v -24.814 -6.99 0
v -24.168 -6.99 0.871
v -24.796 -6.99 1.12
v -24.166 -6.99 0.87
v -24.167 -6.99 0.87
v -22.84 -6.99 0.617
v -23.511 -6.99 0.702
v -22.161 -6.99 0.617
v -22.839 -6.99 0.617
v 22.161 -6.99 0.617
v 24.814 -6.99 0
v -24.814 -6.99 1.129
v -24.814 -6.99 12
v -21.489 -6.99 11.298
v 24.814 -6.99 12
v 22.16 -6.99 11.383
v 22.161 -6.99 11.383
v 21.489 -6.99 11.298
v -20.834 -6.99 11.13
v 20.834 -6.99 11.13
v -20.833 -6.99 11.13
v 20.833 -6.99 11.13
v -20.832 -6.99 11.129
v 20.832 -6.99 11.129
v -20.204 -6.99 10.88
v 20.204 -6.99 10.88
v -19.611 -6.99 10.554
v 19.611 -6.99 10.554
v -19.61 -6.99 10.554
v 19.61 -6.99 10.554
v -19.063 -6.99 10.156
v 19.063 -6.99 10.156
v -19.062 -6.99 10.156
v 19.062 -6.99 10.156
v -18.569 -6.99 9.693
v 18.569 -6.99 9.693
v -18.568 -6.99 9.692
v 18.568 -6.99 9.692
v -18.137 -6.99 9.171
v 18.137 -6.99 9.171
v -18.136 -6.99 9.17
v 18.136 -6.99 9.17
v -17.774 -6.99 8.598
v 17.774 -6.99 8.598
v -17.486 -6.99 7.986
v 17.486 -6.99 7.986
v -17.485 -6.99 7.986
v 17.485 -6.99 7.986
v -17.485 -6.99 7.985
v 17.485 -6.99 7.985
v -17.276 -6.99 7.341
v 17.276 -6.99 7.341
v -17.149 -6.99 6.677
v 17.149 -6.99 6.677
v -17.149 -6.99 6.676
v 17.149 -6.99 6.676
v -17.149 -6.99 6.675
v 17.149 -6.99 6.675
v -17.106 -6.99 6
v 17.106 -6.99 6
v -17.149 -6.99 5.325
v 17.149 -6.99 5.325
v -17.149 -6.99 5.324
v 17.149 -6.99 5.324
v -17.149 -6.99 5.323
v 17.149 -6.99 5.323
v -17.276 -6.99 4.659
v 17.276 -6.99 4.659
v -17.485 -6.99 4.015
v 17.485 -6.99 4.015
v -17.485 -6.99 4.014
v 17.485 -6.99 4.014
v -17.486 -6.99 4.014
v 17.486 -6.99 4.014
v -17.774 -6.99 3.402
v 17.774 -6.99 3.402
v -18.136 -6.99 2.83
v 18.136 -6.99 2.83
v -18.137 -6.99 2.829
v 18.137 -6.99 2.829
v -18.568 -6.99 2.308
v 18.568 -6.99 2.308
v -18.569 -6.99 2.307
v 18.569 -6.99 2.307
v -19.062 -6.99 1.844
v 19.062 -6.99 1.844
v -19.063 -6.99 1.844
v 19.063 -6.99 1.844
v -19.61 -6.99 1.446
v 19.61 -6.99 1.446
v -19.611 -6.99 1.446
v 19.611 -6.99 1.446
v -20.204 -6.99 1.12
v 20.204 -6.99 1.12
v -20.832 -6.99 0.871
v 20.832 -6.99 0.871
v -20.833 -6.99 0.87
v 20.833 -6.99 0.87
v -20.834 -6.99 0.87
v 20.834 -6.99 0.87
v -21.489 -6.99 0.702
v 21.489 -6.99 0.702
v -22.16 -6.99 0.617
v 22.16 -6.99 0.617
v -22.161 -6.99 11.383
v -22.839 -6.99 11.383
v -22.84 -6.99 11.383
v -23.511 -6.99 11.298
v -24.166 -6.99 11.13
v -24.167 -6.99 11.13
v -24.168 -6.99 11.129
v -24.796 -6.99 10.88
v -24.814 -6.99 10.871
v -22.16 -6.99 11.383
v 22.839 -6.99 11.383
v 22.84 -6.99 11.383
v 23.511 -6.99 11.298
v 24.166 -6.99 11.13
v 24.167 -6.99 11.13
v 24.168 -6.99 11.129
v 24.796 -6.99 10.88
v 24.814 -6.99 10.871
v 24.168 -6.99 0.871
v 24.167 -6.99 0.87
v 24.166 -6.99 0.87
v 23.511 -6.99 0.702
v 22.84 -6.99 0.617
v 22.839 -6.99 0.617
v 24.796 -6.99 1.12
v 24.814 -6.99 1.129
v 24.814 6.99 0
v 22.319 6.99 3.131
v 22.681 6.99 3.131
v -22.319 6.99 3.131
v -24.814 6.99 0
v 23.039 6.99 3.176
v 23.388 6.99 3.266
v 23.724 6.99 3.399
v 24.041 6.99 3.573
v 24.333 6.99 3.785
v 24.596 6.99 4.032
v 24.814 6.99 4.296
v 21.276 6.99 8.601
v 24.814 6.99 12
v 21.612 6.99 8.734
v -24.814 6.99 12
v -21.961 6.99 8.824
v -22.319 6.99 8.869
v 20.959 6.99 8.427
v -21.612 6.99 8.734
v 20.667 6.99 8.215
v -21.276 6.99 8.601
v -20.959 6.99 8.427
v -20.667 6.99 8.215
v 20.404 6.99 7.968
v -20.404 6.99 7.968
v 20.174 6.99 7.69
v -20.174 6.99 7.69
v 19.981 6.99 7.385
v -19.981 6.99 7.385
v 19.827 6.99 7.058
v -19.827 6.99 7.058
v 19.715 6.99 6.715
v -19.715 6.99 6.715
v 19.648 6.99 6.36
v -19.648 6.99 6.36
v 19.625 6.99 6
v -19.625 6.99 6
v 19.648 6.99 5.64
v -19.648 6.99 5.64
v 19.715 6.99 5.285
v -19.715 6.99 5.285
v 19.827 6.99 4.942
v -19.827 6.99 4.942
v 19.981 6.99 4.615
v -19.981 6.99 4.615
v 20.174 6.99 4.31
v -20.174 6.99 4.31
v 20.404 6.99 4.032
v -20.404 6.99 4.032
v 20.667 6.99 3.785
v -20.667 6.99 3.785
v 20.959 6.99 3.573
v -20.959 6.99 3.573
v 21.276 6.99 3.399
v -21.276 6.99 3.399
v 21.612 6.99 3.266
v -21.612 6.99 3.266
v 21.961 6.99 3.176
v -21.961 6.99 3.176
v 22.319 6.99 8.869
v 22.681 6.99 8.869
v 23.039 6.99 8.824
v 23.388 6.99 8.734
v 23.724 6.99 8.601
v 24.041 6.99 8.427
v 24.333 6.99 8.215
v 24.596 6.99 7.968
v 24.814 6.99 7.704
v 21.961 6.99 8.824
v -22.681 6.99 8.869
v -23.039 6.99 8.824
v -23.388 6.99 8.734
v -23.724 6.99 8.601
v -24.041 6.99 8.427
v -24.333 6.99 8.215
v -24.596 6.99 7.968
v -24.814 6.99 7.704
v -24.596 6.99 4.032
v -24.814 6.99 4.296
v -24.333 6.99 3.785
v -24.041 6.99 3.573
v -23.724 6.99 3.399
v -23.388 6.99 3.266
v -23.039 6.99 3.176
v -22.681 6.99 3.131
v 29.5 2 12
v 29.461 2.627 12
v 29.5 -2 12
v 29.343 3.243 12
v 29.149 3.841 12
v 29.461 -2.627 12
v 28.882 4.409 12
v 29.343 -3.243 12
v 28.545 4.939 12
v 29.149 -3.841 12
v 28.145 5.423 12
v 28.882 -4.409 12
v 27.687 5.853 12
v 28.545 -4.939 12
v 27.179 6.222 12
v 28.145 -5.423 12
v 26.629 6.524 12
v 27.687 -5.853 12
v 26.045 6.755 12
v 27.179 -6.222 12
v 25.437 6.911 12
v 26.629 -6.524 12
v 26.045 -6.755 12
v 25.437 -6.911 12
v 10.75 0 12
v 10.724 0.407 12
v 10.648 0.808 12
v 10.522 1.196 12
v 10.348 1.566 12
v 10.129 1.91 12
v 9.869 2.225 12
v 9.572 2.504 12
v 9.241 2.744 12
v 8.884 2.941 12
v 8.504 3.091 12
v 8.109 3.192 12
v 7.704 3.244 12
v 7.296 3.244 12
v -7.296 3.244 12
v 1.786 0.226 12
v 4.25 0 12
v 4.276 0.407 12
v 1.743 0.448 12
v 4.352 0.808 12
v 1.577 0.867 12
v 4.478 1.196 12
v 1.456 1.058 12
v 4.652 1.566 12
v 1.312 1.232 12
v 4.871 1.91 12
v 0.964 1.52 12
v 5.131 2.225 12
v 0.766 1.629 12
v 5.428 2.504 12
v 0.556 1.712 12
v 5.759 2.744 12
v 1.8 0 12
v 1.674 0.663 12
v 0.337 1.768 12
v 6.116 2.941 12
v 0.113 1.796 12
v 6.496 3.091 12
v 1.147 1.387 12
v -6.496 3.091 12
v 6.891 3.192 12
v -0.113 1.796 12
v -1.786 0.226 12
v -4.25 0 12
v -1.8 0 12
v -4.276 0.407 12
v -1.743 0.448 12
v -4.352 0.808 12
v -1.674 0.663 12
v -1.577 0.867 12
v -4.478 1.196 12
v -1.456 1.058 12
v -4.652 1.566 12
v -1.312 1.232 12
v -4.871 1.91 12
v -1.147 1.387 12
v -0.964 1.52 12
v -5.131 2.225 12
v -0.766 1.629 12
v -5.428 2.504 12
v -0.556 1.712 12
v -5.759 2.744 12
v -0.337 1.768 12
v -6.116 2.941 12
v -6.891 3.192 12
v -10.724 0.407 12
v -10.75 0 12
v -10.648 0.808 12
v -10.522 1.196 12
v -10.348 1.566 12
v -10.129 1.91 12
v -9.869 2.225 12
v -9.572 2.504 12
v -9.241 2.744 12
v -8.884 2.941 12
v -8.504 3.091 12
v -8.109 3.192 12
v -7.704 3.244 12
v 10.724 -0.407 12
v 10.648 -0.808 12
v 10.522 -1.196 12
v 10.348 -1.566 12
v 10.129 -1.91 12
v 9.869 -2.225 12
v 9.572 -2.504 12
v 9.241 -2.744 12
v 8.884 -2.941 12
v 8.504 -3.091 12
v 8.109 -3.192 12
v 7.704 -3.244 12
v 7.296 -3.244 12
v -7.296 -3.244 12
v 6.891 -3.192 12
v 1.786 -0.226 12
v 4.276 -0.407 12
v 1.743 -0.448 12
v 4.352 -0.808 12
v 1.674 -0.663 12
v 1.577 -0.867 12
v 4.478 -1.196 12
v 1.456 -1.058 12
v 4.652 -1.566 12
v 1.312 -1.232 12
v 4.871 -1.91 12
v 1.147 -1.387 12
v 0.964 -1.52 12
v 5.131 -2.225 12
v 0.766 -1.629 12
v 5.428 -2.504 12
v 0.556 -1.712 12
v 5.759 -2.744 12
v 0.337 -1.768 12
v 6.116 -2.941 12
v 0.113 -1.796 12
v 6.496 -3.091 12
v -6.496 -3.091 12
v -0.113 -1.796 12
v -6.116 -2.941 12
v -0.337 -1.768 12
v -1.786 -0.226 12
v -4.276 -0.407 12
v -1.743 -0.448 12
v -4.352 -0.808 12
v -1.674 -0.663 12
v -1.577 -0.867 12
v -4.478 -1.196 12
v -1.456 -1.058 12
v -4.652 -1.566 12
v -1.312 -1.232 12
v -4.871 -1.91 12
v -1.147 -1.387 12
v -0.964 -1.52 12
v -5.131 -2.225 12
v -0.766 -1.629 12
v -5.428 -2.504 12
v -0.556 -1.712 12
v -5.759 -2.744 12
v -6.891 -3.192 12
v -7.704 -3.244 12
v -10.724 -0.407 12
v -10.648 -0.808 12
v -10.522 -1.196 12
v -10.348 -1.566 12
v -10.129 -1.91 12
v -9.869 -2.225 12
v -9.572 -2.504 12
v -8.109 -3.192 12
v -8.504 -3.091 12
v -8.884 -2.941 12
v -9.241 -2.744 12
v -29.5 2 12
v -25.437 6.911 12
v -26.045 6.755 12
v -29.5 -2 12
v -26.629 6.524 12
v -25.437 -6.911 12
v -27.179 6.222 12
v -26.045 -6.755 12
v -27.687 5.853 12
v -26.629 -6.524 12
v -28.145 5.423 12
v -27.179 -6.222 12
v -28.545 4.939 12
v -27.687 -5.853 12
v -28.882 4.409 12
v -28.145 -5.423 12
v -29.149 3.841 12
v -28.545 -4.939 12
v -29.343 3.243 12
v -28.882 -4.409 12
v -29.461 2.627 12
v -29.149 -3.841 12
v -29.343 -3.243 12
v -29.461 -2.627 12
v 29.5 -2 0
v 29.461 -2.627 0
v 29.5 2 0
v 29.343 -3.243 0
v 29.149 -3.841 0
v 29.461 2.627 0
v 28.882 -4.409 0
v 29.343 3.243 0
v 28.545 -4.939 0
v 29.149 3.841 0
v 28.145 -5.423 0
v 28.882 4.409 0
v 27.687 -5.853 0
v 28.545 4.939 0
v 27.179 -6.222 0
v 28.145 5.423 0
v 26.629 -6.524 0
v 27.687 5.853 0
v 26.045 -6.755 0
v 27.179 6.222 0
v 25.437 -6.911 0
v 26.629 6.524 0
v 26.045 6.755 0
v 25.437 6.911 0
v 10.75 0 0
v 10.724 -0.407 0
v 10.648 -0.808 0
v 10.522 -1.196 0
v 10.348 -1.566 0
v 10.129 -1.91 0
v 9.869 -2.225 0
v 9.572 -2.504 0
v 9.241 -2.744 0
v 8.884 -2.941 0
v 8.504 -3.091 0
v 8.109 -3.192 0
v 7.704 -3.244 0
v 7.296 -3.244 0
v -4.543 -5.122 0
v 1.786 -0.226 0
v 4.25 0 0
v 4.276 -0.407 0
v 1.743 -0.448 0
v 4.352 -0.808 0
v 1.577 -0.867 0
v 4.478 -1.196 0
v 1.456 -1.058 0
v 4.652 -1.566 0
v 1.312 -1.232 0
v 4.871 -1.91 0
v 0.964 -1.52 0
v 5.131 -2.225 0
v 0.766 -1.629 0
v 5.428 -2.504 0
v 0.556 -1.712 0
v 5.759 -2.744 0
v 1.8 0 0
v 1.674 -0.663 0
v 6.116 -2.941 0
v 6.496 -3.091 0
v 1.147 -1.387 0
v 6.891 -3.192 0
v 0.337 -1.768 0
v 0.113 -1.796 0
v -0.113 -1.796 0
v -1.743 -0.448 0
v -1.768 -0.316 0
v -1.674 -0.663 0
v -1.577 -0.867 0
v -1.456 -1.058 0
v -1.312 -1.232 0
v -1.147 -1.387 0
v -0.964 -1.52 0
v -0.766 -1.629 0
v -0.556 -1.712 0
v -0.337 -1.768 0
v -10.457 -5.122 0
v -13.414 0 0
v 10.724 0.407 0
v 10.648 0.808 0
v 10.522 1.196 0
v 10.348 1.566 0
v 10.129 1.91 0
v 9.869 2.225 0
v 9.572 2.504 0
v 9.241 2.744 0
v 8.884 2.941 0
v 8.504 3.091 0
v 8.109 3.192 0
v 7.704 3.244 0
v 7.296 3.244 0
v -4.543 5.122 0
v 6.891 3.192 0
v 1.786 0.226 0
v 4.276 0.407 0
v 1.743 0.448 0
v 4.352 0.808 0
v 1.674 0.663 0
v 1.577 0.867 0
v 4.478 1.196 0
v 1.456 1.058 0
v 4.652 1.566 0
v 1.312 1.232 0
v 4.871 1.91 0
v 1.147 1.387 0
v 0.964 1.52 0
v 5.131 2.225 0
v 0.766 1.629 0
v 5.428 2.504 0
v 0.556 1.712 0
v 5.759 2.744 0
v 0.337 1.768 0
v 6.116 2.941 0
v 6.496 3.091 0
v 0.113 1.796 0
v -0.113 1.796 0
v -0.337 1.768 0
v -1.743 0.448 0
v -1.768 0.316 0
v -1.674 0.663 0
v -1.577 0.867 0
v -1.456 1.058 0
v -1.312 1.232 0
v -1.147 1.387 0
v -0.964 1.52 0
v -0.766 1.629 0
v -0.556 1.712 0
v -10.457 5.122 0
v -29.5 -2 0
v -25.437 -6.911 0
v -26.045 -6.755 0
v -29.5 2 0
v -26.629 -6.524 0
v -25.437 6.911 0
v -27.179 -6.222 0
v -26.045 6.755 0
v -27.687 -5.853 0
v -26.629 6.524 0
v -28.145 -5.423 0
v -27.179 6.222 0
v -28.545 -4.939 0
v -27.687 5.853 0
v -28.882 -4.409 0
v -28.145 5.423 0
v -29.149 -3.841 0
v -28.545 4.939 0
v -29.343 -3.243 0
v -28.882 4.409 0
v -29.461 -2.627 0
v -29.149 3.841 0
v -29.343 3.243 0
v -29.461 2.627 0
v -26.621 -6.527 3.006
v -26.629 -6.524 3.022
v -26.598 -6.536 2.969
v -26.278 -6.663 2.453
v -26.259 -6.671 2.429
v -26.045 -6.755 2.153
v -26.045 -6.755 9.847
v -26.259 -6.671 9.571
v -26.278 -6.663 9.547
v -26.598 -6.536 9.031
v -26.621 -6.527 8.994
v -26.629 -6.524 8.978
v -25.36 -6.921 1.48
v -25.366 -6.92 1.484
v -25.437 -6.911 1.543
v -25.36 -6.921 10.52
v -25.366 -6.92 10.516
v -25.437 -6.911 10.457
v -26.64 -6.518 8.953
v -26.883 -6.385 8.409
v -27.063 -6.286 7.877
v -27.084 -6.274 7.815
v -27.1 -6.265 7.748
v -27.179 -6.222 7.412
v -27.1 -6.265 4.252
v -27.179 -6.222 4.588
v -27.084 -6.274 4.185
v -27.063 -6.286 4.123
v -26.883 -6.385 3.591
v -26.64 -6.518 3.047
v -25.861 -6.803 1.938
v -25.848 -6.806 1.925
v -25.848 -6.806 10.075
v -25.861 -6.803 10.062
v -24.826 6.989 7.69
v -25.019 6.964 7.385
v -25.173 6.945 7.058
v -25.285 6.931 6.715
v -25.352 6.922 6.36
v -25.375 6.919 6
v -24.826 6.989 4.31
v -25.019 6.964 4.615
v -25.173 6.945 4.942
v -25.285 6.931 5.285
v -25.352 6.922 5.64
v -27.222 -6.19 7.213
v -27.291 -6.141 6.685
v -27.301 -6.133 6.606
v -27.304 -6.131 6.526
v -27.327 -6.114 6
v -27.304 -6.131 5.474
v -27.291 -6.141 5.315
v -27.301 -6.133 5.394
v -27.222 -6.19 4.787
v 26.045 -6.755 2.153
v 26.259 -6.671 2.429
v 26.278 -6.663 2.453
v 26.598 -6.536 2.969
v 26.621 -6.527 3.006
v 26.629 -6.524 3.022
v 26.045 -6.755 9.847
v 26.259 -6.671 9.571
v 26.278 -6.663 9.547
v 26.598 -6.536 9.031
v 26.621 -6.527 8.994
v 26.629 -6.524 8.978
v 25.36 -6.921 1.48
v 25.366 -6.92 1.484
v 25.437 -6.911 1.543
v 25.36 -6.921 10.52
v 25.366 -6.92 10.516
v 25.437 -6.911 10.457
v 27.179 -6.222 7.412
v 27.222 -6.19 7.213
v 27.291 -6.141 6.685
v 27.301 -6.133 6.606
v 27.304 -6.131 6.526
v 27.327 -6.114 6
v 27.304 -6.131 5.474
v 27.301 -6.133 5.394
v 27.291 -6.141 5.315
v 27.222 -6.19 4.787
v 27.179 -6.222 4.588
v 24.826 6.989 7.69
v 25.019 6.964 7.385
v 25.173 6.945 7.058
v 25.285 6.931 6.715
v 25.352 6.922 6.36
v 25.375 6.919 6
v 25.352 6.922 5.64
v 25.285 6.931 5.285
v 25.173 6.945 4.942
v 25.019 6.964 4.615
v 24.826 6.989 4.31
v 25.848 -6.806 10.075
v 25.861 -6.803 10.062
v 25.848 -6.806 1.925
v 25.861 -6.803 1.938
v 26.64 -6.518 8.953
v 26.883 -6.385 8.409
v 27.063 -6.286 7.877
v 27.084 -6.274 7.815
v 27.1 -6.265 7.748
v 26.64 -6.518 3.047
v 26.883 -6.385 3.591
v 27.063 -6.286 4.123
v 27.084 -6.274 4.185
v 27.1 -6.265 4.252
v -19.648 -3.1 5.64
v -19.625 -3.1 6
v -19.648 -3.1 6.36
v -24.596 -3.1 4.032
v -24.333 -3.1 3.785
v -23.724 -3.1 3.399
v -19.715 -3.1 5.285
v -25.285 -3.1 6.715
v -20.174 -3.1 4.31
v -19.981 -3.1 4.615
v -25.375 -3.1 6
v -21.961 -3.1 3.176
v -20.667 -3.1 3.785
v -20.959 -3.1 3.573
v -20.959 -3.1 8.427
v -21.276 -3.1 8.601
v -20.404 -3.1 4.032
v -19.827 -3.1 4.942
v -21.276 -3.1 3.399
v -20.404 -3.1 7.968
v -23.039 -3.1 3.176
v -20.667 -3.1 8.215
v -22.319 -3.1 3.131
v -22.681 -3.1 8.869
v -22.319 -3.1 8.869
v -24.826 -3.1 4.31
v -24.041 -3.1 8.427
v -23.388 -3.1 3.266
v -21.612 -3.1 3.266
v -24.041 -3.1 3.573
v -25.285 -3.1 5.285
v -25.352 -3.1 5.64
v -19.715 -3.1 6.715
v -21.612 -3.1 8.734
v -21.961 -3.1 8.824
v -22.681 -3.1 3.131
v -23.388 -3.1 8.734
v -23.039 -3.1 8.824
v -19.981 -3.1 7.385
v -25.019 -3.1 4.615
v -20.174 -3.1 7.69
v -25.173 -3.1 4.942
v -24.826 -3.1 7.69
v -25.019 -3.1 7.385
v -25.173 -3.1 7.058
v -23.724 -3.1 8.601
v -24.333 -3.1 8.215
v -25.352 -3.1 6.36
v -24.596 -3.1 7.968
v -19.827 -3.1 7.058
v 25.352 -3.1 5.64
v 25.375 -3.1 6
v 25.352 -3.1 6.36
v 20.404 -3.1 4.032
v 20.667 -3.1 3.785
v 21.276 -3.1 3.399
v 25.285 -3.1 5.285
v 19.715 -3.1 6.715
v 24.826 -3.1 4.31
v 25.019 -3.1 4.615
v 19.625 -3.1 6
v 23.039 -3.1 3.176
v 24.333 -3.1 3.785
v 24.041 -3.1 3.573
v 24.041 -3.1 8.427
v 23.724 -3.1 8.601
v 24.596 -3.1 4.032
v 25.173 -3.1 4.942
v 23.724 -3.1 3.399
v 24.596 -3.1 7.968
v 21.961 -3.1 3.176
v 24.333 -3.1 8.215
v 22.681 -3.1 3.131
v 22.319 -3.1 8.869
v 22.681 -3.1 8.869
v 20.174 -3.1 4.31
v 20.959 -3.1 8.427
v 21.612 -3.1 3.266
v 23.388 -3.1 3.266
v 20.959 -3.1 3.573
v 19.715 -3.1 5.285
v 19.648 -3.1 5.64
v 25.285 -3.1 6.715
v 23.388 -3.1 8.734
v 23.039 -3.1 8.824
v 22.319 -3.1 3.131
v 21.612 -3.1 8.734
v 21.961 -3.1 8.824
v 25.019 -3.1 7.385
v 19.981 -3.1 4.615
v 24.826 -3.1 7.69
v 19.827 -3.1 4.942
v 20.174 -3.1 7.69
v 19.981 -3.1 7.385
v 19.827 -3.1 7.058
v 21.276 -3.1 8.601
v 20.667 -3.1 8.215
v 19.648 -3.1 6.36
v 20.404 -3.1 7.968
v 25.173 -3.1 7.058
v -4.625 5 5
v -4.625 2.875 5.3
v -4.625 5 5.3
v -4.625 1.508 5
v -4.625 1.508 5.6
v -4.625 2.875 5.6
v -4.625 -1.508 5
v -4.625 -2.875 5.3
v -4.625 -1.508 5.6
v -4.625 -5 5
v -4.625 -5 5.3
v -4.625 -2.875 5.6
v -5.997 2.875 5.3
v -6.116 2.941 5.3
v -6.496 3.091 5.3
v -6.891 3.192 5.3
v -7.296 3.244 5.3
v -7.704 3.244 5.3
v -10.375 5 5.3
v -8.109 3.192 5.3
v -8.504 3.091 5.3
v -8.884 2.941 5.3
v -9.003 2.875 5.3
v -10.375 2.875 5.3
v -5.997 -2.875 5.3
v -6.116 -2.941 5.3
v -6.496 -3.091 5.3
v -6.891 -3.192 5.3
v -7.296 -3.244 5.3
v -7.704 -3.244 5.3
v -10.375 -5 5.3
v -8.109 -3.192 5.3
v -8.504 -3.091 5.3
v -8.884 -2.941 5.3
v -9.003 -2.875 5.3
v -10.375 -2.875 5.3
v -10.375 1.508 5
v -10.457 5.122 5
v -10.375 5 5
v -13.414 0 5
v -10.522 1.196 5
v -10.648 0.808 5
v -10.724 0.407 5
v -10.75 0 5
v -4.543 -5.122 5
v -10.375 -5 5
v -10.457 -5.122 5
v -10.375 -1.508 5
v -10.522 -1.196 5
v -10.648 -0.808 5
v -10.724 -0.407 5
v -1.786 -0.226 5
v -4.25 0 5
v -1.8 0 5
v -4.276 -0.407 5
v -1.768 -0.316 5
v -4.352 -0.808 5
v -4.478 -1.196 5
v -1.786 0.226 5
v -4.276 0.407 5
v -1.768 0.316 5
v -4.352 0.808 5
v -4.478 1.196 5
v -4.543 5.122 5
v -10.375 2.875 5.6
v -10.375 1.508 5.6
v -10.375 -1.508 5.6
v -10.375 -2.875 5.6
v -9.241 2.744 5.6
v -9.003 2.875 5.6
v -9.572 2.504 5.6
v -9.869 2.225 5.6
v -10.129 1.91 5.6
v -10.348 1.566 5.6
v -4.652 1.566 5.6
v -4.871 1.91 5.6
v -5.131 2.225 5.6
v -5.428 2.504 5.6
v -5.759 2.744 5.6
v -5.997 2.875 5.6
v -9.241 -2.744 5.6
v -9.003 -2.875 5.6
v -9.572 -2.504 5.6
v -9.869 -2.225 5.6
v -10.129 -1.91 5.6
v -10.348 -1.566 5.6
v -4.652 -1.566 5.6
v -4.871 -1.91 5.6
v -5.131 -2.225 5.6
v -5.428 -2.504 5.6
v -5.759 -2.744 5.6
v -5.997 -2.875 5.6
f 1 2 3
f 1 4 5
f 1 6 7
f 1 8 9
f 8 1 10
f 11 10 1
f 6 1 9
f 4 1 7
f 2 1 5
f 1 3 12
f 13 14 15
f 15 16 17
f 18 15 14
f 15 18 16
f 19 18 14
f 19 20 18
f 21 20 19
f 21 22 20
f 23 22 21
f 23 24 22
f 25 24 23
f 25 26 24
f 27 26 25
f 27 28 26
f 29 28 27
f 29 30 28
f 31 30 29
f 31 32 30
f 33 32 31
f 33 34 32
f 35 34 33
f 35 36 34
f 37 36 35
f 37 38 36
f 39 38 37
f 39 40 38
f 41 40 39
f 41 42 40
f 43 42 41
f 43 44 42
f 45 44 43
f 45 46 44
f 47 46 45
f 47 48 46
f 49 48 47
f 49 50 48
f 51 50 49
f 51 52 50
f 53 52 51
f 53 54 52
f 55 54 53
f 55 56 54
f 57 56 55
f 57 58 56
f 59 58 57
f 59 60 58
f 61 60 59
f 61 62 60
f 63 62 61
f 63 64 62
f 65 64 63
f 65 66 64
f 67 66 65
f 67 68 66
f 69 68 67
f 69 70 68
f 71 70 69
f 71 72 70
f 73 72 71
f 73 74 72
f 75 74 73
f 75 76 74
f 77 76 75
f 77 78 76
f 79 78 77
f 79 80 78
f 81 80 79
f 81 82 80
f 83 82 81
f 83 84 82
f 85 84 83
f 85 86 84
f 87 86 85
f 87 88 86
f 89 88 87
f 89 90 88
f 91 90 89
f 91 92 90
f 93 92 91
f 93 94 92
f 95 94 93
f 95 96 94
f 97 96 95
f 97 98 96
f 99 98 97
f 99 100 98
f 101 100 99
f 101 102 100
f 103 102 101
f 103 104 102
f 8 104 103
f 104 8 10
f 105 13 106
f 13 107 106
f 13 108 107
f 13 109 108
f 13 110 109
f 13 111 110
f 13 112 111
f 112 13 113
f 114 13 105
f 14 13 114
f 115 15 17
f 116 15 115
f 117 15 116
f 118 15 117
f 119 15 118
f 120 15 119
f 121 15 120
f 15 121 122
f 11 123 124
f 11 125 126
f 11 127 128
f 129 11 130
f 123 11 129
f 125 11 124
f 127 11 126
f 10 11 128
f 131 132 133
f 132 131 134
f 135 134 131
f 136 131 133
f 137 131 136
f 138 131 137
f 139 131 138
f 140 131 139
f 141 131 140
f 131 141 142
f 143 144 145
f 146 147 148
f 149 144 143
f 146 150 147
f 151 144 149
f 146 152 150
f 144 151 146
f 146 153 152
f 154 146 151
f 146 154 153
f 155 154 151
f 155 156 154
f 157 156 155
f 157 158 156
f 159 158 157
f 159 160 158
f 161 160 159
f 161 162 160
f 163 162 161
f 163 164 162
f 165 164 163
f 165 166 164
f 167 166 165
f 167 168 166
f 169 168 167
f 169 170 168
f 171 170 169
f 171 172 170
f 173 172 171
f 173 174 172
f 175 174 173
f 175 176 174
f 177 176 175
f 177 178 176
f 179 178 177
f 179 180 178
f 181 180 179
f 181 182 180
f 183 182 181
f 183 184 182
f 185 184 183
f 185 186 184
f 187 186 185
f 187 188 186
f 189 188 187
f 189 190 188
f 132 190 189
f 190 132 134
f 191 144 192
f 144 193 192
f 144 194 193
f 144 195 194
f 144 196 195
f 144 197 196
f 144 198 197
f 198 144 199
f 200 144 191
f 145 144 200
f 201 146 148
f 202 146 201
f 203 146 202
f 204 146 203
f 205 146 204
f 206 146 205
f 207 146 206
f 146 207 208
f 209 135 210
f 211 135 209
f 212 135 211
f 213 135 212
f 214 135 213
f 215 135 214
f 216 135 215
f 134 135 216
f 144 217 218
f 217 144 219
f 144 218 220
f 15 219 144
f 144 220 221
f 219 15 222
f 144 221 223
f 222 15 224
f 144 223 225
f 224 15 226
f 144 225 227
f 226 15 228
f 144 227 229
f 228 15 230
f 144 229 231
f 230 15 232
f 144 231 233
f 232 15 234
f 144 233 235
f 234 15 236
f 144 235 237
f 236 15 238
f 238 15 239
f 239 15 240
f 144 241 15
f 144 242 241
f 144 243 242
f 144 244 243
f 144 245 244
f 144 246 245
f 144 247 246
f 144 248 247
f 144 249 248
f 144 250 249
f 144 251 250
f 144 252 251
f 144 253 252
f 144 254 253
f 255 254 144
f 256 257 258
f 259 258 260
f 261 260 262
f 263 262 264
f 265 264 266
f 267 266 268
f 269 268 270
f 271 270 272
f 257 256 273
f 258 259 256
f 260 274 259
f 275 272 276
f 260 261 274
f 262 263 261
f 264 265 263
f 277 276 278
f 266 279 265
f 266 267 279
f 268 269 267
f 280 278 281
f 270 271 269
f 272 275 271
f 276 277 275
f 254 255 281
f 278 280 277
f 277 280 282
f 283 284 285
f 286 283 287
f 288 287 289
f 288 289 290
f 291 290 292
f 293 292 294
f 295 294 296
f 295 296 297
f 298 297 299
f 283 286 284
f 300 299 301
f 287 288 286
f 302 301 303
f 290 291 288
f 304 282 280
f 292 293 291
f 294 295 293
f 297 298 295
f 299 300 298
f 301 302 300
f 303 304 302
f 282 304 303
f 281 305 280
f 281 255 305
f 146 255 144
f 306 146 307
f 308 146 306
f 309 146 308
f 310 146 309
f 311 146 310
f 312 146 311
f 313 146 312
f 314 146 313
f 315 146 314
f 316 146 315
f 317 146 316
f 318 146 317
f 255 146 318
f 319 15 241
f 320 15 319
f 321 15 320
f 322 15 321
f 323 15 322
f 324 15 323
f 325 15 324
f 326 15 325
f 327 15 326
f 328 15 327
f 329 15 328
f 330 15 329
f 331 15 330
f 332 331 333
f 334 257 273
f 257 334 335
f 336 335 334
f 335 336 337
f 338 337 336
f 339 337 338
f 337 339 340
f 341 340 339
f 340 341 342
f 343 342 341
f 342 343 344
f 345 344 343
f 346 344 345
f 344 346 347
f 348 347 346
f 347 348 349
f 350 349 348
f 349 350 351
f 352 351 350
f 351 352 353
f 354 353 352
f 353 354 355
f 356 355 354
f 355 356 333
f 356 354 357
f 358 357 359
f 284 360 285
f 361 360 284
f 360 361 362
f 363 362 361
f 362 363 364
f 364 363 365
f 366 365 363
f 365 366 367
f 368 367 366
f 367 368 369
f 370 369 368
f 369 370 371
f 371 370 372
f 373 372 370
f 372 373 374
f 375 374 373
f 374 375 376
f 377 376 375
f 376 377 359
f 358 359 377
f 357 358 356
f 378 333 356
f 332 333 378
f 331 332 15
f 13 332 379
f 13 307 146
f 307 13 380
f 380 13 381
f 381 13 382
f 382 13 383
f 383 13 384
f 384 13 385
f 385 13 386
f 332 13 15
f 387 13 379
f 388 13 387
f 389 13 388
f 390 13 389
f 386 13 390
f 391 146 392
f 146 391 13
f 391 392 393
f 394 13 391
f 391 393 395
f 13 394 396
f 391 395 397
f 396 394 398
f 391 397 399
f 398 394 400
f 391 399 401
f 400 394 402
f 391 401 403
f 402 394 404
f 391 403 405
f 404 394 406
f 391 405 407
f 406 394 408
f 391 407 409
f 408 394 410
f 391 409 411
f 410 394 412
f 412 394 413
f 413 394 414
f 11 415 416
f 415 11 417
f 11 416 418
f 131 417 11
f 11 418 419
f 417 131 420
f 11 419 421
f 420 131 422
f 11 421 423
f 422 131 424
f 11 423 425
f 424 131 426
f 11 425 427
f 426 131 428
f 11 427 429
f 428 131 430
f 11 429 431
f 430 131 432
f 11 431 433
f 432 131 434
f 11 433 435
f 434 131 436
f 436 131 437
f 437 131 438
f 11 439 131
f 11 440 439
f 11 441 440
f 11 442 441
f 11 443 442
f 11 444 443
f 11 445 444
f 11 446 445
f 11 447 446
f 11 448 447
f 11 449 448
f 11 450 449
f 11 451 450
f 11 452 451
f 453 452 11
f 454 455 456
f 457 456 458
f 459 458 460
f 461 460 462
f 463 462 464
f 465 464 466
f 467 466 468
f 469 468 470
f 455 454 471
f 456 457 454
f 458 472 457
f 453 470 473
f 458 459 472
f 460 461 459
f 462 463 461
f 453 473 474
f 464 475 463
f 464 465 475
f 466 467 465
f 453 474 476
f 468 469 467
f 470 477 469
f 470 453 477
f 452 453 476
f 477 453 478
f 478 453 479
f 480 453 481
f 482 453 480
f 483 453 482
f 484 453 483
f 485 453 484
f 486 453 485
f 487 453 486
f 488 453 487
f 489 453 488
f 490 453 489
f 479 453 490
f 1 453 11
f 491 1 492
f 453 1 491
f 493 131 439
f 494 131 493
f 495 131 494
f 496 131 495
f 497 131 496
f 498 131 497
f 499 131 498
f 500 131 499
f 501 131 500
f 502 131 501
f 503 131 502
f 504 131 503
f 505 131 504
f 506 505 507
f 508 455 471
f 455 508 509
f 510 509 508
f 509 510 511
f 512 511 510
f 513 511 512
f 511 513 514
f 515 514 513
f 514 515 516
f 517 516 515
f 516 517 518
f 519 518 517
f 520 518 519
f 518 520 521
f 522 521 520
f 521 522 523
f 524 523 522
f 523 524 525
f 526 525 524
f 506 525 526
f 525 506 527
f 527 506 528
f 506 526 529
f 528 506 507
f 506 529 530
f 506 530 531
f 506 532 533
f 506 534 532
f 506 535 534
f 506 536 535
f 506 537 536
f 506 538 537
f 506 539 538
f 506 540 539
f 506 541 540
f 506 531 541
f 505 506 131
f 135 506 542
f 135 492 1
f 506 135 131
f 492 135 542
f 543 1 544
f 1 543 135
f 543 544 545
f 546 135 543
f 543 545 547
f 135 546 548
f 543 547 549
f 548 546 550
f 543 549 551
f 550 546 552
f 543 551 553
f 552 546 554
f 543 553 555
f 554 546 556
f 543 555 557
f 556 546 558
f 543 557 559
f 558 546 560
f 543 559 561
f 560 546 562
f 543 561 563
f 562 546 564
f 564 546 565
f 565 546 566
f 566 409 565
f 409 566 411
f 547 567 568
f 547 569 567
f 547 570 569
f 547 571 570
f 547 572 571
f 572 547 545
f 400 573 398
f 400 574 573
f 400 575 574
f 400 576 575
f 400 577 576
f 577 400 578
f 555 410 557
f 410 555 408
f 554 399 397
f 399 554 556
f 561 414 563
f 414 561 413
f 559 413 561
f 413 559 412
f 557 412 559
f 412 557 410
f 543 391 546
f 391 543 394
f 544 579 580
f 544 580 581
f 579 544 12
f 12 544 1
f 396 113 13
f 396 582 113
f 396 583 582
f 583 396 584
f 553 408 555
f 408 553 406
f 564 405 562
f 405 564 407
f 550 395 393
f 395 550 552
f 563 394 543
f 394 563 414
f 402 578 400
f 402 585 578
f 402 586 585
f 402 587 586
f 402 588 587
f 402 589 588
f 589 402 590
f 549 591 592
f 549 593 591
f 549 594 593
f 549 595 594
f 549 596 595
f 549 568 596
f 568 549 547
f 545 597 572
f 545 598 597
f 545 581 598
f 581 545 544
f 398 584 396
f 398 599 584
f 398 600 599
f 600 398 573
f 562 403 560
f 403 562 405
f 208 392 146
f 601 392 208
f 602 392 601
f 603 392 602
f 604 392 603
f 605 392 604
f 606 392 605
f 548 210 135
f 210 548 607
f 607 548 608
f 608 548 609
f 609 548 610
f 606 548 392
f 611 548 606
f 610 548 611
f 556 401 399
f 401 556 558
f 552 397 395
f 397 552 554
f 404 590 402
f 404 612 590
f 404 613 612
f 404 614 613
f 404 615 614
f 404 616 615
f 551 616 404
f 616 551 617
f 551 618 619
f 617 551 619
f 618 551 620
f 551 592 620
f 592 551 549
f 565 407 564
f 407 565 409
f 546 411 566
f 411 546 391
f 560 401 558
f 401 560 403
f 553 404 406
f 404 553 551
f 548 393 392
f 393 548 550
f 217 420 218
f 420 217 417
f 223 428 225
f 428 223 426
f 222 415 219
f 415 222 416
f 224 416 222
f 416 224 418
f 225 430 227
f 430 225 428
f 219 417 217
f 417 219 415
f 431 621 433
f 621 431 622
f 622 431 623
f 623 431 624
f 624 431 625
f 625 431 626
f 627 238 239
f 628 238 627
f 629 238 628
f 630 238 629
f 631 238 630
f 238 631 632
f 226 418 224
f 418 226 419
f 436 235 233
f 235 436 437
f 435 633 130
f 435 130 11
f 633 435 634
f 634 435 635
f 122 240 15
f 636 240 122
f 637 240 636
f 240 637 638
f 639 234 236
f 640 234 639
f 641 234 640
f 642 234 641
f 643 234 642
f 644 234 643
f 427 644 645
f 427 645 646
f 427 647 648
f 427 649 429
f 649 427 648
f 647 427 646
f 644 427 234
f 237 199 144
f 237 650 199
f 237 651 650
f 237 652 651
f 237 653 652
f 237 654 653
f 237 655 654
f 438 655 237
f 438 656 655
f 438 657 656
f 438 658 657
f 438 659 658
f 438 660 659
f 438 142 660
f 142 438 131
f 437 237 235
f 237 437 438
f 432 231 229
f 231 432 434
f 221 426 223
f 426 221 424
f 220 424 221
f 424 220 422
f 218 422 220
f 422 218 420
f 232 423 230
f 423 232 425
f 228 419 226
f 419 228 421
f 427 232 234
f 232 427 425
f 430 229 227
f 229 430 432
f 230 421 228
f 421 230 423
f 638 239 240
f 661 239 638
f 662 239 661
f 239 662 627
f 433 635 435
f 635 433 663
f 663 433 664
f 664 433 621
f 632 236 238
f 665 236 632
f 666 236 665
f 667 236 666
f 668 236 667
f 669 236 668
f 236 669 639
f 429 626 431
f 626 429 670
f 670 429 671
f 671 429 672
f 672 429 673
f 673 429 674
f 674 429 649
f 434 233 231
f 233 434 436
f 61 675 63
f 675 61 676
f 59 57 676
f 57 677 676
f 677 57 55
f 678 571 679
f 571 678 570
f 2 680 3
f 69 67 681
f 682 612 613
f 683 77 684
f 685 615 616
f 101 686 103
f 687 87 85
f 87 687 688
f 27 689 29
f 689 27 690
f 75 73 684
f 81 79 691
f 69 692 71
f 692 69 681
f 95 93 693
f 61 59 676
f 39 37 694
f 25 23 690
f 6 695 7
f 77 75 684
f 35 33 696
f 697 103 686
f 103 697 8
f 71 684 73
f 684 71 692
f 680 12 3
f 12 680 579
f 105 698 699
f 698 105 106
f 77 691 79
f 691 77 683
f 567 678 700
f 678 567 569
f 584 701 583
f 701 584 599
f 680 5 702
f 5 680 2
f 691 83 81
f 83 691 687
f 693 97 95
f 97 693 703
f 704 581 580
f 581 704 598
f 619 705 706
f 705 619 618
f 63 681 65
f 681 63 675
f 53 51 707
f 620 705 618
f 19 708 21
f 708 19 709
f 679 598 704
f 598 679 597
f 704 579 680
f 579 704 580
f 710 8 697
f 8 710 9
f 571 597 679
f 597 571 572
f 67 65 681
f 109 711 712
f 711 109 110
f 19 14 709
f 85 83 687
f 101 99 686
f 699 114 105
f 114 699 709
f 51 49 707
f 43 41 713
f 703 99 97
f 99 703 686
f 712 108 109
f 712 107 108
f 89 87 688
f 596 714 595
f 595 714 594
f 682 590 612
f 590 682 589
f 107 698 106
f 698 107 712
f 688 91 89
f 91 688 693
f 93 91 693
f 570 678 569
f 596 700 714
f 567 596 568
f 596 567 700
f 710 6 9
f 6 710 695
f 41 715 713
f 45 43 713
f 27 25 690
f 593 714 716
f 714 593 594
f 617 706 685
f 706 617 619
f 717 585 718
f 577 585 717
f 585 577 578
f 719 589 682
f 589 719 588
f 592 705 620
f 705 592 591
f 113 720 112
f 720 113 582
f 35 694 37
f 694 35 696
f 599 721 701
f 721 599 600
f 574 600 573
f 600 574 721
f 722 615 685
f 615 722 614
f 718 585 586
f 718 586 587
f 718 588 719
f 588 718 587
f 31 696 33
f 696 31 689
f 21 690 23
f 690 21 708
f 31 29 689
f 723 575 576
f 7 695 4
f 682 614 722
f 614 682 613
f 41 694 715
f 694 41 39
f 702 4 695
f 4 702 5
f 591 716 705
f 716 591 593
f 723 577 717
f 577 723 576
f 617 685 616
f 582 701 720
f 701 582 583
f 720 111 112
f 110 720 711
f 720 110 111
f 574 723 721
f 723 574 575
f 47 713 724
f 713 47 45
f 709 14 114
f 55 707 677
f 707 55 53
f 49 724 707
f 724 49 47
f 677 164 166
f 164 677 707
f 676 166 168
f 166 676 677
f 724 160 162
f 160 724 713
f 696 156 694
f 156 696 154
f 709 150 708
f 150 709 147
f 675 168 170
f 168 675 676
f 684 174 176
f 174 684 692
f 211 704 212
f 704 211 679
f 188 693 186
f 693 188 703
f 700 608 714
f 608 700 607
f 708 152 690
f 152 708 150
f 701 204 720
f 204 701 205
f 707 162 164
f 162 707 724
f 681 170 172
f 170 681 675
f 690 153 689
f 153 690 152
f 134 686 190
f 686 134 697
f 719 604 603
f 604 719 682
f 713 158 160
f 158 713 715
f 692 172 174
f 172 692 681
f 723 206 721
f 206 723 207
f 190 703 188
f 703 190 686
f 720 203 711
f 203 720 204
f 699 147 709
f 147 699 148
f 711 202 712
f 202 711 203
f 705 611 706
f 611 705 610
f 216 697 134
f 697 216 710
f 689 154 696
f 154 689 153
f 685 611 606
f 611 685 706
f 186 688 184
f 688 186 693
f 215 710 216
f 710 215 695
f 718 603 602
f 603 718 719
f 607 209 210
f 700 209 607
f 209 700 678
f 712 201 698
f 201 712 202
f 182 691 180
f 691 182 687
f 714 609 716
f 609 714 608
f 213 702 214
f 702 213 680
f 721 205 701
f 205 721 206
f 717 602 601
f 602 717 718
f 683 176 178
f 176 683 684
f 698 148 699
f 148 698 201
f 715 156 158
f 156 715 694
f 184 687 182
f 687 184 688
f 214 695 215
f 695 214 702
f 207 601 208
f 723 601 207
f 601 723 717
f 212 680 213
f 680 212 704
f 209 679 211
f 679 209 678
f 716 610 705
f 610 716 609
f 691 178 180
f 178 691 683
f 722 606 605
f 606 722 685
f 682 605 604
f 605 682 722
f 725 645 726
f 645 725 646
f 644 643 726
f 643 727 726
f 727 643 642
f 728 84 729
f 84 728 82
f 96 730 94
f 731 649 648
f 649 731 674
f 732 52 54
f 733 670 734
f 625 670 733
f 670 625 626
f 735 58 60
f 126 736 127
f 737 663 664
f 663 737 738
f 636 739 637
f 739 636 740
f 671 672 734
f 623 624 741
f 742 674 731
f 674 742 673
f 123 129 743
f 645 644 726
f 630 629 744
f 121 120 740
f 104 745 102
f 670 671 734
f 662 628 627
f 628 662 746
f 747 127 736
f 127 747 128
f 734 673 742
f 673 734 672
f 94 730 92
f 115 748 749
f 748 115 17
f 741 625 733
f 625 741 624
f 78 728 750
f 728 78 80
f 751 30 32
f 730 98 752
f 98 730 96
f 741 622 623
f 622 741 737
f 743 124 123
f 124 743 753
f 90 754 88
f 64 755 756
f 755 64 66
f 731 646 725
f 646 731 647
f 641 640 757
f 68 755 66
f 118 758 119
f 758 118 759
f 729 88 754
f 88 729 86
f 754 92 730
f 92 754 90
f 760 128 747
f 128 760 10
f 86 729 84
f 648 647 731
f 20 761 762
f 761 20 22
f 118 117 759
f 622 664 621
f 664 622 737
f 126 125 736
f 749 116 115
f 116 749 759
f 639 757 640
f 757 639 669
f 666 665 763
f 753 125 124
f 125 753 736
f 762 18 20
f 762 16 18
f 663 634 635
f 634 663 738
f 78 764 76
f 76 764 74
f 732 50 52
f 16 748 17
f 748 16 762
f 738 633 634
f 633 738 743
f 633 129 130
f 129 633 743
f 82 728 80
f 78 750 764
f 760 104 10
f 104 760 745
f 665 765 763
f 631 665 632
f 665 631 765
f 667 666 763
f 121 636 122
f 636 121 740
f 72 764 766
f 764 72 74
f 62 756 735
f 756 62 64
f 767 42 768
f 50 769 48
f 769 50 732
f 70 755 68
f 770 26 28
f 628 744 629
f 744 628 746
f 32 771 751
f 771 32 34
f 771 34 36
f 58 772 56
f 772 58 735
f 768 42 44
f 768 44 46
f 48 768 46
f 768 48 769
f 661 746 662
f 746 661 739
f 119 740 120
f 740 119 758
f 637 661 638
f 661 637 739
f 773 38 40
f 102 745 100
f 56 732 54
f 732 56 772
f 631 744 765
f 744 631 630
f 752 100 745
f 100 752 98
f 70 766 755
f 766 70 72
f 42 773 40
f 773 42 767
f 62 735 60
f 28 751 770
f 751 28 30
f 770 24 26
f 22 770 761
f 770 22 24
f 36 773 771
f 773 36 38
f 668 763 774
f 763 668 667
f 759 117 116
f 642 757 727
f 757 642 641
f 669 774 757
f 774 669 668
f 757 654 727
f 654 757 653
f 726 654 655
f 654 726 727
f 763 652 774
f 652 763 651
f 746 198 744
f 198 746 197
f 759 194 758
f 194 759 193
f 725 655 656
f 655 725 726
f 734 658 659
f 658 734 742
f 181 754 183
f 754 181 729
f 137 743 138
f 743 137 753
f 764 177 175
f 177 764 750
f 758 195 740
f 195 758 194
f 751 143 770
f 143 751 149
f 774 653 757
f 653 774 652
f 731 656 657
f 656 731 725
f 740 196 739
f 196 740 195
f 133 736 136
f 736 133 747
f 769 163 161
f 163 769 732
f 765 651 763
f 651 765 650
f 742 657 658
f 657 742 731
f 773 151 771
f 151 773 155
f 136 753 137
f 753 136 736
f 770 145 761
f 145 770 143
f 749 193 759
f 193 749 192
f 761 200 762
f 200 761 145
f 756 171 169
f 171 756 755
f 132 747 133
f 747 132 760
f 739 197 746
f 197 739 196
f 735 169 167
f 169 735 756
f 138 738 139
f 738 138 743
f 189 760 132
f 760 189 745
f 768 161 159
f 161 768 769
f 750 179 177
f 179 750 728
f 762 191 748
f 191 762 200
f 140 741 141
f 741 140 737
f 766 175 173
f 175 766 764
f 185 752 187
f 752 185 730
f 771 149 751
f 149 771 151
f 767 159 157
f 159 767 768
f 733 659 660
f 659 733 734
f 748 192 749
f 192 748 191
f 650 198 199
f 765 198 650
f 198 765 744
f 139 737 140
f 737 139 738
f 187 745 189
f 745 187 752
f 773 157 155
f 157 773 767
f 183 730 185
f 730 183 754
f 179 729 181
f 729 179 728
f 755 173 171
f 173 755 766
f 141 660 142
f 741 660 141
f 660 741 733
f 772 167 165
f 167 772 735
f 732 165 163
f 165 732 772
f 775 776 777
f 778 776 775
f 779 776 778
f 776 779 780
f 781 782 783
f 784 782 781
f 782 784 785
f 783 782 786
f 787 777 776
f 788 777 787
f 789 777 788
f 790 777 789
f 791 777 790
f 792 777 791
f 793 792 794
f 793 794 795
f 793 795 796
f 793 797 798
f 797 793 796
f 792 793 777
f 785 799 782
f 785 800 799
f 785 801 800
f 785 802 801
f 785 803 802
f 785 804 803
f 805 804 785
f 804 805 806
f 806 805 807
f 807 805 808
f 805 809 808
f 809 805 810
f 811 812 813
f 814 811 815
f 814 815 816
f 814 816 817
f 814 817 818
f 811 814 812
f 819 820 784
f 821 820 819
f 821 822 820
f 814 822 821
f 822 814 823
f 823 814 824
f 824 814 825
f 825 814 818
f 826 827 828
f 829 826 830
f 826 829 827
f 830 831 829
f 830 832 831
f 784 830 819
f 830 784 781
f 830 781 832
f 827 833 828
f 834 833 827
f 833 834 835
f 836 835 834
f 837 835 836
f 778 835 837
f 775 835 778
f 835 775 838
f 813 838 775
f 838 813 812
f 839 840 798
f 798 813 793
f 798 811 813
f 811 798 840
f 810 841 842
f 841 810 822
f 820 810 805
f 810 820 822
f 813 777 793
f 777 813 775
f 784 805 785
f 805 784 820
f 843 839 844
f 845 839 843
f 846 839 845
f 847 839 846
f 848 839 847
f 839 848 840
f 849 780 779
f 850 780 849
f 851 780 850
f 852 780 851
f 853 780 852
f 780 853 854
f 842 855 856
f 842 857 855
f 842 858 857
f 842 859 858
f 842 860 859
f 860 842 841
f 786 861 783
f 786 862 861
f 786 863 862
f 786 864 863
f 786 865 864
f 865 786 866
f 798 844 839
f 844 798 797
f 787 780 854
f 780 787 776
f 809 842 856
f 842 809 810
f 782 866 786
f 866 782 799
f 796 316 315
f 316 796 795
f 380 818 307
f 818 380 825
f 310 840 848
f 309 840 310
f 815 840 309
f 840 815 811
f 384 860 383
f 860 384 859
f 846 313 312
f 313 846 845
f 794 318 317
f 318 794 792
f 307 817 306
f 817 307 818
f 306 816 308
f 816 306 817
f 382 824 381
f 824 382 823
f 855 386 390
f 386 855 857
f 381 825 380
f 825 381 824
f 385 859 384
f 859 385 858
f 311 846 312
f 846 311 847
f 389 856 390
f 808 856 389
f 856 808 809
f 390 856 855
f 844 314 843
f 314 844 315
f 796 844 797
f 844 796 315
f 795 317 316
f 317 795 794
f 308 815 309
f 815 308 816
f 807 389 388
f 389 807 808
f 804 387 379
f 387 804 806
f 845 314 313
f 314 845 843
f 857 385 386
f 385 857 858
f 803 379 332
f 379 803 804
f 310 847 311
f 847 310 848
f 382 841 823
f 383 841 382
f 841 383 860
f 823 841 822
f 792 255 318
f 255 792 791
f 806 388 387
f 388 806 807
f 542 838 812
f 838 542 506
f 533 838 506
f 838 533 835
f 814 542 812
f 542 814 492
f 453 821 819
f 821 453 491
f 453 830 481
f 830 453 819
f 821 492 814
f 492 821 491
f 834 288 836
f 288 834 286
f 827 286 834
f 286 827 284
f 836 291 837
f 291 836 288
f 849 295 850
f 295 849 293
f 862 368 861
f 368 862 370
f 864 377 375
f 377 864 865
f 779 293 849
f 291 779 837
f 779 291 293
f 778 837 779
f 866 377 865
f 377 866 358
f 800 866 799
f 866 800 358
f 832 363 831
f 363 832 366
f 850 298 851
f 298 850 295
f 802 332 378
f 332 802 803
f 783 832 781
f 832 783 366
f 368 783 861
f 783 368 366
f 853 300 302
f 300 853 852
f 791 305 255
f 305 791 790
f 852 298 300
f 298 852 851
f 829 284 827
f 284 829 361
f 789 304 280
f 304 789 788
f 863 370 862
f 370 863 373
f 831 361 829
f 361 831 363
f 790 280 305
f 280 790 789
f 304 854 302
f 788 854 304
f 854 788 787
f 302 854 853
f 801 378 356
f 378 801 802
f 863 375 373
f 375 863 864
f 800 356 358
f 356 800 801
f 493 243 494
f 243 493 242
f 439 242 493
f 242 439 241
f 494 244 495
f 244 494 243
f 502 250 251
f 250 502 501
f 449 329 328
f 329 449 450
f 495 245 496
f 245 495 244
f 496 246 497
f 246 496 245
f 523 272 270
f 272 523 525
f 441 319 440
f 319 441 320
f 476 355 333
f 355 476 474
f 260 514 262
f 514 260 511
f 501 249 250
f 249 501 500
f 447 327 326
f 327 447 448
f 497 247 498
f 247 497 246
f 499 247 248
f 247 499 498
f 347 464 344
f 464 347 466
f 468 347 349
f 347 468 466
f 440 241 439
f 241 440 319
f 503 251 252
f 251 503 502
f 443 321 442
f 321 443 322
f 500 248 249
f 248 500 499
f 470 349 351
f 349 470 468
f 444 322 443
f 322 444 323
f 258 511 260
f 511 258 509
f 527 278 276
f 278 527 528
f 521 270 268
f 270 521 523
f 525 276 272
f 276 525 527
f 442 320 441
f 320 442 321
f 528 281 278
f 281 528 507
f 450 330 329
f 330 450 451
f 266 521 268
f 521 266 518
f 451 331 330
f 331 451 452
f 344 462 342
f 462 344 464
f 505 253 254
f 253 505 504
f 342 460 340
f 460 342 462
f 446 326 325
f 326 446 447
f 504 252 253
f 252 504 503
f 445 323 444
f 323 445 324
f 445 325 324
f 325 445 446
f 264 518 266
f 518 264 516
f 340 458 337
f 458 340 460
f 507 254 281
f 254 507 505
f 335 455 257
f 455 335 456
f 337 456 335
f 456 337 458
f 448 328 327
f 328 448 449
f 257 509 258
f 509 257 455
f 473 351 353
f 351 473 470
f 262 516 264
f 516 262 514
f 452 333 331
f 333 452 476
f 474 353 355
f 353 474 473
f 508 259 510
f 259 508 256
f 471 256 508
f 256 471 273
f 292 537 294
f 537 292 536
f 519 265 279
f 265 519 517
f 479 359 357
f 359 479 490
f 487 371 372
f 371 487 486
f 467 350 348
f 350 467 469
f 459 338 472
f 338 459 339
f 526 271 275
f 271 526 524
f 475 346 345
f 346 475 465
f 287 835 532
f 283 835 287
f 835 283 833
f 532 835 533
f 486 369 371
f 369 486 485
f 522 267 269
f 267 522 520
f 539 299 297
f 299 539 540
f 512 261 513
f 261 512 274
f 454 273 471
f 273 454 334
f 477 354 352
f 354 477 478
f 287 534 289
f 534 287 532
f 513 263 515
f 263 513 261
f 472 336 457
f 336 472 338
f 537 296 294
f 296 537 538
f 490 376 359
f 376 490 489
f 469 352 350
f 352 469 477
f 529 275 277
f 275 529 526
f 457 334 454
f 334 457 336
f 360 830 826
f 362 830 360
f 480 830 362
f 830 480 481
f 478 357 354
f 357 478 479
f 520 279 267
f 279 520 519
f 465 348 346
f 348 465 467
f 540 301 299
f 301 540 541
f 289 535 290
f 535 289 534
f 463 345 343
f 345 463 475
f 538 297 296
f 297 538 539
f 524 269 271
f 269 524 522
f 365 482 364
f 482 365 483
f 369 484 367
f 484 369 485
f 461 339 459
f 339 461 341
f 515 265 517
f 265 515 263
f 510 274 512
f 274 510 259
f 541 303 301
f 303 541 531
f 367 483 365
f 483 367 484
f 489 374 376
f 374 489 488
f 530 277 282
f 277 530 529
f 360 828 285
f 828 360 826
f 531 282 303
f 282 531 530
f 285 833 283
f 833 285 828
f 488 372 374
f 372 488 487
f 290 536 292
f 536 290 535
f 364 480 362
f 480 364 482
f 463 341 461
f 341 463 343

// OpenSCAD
$fn = 50;


difference() {
	union() {
		hull() {
			translate(v = [-9.5000000000, 2.0000000000, 0]) {
				cylinder(h = 12, r = 5);
			}
			translate(v = [9.5000000000, 2.0000000000, 0]) {
				cylinder(h = 12, r = 5);
			}
			translate(v = [-9.5000000000, -2.0000000000, 0]) {
				cylinder(h = 12, r = 5);
			}
			translate(v = [9.5000000000, -2.0000000000, 0]) {
				cylinder(h = 12, r = 5);
			}
		}
		translate(v = [-15.0000000000, 0.0000000000, 0]) {
			hull() {
				translate(v = [-9.5000000000, 2.0000000000, 0]) {
					cylinder(h = 12, r = 5);
				}
				translate(v = [9.5000000000, 2.0000000000, 0]) {
					cylinder(h = 12, r = 5);
				}
				translate(v = [-9.5000000000, -2.0000000000, 0]) {
					cylinder(h = 12, r = 5);
				}
				translate(v = [9.5000000000, -2.0000000000, 0]) {
					cylinder(h = 12, r = 5);
				}
			}
		}
		translate(v = [15.0000000000, 0.0000000000, 0]) {
			hull() {
				translate(v = [-9.5000000000, 2.0000000000, 0]) {
					cylinder(h = 12, r = 5);
				}
				translate(v = [9.5000000000, 2.0000000000, 0]) {
					cylinder(h = 12, r = 5);
				}
				translate(v = [-9.5000000000, -2.0000000000, 0]) {
					cylinder(h = 12, r = 5);
				}
				translate(v = [9.5000000000, -2.0000000000, 0]) {
					cylinder(h = 12, r = 5);
				}
			}
		}
	}
	union() {
		translate(v = [-22.5000000000, -7.0000000000, 6.0000000000]) {
			rotate(a = [90, 0, 0]) {
				difference() {
					union() {
						#translate(v = [0, 0, -14.0000000000]) {
							cylinder(h = 14, r = 2.6000000000);
						}
						#translate(v = [0, 0, -3.9000000000]) {
							cylinder(h = 3.9000000000, r1 = 2.8750000000, r2 = 5.4000000000);
						}
						#translate(v = [0, 0, -14.0000000000]) {
							cylinder(h = 14, r = 2.8750000000);
						}
						#translate(v = [0, 0, -14.0000000000]) {
							cylinder(h = 14, r = 2.6000000000);
						}
					}
					union();
				}
			}
		}
		translate(v = [22.5000000000, -7.0000000000, 6.0000000000]) {
			rotate(a = [90, 0, 0]) {
				difference() {
					union() {
						#translate(v = [0, 0, -14.0000000000]) {
							cylinder(h = 14, r = 2.6000000000);
						}
						#translate(v = [0, 0, -3.9000000000]) {
							cylinder(h = 3.9000000000, r1 = 2.8750000000, r2 = 5.4000000000);
						}
						#translate(v = [0, 0, -14.0000000000]) {
							cylinder(h = 14, r = 2.8750000000);
						}
						#translate(v = [0, 0, -14.0000000000]) {
							cylinder(h = 14, r = 2.6000000000);
						}
					}
					union();
				}
			}
		}
		translate(v = [-7.5000000000, 0.0000000000, 0]) {
			rotate(a = [0, 0, 0]) {
				difference() {
					union() {
						#translate(v = [-2.8750000000, -5.0000000000, -0.3000000000]) {
							cube(size = [5.7500000000, 10, 0.3000000000]);
						}
						#translate(v = [-2.8750000000, -2.8750000000, -0.6000000000]) {
							cube(size = [5.7500000000, 5.7500000000, 0.3000000000]);
						}
						#translate(v = [-2.8750000000, -5.0000000000, 5]) {
							cube(size = [5.7500000000, 10, 0.3000000000]);
						}
						#translate(v = [-2.8750000000, -2.8750000000, 5.3000000000]) {
							cube(size = [5.7500000000, 5.7500000000, 0.3000000000]);
						}
						#translate(v = [0, 0, -100.0000000000]) {
							cylinder(h = 200, r = 3.2500000000);
						}
						#linear_extrude(height = 5) {
							polygon(points = [[5.9142500000, 0.0000000000], [2.9571250000, 5.1218907443], [-2.9571250000, 5.1218907443], [-5.9142500000, 0.0000000000], [-2.9571250000, -5.1218907443], [2.9571250000, -5.1218907443]]);
						}
						#translate(v = [-2.8750000000, -5.0000000000, -0.3000000000]) {
							cube(size = [5.7500000000, 10, 0.3000000000]);
						}
						#translate(v = [-2.8750000000, -2.8750000000, -0.6000000000]) {
							cube(size = [5.7500000000, 5.7500000000, 0.3000000000]);
						}
						#translate(v = [-2.8750000000, -5.0000000000, 5]) {
							cube(size = [5.7500000000, 10, 0.3000000000]);
						}
						#translate(v = [-2.8750000000, -2.8750000000, 5.3000000000]) {
							cube(size = [5.7500000000, 5.7500000000, 0.3000000000]);
						}
						#translate(v = [0, 0, -100.0000000000]) {
							cylinder(h = 200, r = 3.2500000000);
						}
						#translate(v = [-2.8750000000, -5.0000000000, -0.3000000000]) {
							cube(size = [5.7500000000, 10, 0.3000000000]);
						}
						#translate(v = [-2.8750000000, -2.8750000000, -0.6000000000]) {
							cube(size = [5.7500000000, 5.7500000000, 0.3000000000]);
						}
						#translate(v = [-2.8750000000, -5.0000000000, 5]) {
							cube(size = [5.7500000000, 10, 0.3000000000]);
						}
						#translate(v = [-2.8750000000, -2.8750000000, 5.3000000000]) {
							cube(size = [5.7500000000, 5.7500000000, 0.3000000000]);
						}
						#translate(v = [0, 0, -100.0000000000]) {
							cylinder(h = 200, r = 3.2500000000);
						}
					}
					union();
				}
			}
		}
		translate(v = [-7.5000000000, 0.0000000000, 0]) {
			translate(v = [0, 0, -100]) {
				cylinder(h = 200, r = 3.2500000000);
			}
		}
		translate(v = [7.5000000000, 0.0000000000, 0]) {
			translate(v = [0, 0, -100]) {
				cylinder(h = 200, r = 3.2500000000);
			}
		}
		translate(v = [-7.5000000000, 0.0000000000, 0]) {
			translate(v = [0, 0, -100]) {
				cylinder(h = 200, r = 1.8000000000);
			}
		}
		translate(v = [0, 0, -100]) {
			cylinder(h = 200, r = 1.8000000000);
		}
		translate(v = [7.5000000000, 0.0000000000, 0]) {
			translate(v = [0, 0, -100]) {
				cylinder(h = 200, r = 1.8000000000);
			}
		}
	}
}
